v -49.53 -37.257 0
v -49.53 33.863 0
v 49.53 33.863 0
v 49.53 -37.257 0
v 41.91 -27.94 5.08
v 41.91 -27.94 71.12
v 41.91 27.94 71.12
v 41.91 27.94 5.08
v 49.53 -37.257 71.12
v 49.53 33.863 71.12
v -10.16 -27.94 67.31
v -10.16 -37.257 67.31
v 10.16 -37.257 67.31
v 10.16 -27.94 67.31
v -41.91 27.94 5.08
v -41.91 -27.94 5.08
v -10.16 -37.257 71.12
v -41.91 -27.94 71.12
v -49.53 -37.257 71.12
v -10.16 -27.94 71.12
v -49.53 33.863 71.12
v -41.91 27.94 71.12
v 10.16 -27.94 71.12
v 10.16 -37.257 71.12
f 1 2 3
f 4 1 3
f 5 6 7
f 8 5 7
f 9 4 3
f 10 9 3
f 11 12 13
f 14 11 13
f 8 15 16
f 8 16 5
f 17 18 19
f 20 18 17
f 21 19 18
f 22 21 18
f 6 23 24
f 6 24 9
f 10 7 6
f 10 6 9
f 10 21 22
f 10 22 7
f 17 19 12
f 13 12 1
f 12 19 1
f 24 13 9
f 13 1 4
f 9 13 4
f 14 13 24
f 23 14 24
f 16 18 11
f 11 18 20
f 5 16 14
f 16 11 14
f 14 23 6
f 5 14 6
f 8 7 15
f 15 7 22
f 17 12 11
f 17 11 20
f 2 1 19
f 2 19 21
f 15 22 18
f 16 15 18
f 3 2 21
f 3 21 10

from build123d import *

# Parameters (mm, degrees)
F0_W     = 99.06
F0_H     = 71.12
F1_DEPTH = 71.12
F2_W     = 41.91
F2_H     = 27.94
F3_DEPTH = 66.04
F4_W     = 20.32
F4_H     = 3.81
F5_DEPTH = 10.16


with BuildPart() as f1:
    # F0 (on Top) → F1 (new body)
    with BuildSketch(Plane.XY):
        with Locations((0, -1.696959)):
            Rectangle(F0_W, F0_H)
    extrude(amount=F1_DEPTH)

    # F2 (on face) → F3 (cut)
    with BuildSketch(Plane.XY.offset(71.12)):
        with Locations((-20.955, 13.97)):
            Rectangle(F2_W, F2_H)
        with Locations((20.955, 13.97)):
            Rectangle(F2_W, F2_H)
        with Locations((20.955, -13.97)):
            Rectangle(F2_W, F2_H)
        with Locations((-20.955, -13.97)):
            Rectangle(F2_W, F2_H)
    extrude(amount=-F3_DEPTH, mode=Mode.SUBTRACT)

    # F4 (on face) → F5 (cut)
    with BuildSketch(Plane.XZ.offset(37.256959)):
        with Locations((0, 69.215)):
            Rectangle(F4_W, F4_H)
    extrude(amount=-F5_DEPTH, mode=Mode.SUBTRACT)


solid = f1.part
